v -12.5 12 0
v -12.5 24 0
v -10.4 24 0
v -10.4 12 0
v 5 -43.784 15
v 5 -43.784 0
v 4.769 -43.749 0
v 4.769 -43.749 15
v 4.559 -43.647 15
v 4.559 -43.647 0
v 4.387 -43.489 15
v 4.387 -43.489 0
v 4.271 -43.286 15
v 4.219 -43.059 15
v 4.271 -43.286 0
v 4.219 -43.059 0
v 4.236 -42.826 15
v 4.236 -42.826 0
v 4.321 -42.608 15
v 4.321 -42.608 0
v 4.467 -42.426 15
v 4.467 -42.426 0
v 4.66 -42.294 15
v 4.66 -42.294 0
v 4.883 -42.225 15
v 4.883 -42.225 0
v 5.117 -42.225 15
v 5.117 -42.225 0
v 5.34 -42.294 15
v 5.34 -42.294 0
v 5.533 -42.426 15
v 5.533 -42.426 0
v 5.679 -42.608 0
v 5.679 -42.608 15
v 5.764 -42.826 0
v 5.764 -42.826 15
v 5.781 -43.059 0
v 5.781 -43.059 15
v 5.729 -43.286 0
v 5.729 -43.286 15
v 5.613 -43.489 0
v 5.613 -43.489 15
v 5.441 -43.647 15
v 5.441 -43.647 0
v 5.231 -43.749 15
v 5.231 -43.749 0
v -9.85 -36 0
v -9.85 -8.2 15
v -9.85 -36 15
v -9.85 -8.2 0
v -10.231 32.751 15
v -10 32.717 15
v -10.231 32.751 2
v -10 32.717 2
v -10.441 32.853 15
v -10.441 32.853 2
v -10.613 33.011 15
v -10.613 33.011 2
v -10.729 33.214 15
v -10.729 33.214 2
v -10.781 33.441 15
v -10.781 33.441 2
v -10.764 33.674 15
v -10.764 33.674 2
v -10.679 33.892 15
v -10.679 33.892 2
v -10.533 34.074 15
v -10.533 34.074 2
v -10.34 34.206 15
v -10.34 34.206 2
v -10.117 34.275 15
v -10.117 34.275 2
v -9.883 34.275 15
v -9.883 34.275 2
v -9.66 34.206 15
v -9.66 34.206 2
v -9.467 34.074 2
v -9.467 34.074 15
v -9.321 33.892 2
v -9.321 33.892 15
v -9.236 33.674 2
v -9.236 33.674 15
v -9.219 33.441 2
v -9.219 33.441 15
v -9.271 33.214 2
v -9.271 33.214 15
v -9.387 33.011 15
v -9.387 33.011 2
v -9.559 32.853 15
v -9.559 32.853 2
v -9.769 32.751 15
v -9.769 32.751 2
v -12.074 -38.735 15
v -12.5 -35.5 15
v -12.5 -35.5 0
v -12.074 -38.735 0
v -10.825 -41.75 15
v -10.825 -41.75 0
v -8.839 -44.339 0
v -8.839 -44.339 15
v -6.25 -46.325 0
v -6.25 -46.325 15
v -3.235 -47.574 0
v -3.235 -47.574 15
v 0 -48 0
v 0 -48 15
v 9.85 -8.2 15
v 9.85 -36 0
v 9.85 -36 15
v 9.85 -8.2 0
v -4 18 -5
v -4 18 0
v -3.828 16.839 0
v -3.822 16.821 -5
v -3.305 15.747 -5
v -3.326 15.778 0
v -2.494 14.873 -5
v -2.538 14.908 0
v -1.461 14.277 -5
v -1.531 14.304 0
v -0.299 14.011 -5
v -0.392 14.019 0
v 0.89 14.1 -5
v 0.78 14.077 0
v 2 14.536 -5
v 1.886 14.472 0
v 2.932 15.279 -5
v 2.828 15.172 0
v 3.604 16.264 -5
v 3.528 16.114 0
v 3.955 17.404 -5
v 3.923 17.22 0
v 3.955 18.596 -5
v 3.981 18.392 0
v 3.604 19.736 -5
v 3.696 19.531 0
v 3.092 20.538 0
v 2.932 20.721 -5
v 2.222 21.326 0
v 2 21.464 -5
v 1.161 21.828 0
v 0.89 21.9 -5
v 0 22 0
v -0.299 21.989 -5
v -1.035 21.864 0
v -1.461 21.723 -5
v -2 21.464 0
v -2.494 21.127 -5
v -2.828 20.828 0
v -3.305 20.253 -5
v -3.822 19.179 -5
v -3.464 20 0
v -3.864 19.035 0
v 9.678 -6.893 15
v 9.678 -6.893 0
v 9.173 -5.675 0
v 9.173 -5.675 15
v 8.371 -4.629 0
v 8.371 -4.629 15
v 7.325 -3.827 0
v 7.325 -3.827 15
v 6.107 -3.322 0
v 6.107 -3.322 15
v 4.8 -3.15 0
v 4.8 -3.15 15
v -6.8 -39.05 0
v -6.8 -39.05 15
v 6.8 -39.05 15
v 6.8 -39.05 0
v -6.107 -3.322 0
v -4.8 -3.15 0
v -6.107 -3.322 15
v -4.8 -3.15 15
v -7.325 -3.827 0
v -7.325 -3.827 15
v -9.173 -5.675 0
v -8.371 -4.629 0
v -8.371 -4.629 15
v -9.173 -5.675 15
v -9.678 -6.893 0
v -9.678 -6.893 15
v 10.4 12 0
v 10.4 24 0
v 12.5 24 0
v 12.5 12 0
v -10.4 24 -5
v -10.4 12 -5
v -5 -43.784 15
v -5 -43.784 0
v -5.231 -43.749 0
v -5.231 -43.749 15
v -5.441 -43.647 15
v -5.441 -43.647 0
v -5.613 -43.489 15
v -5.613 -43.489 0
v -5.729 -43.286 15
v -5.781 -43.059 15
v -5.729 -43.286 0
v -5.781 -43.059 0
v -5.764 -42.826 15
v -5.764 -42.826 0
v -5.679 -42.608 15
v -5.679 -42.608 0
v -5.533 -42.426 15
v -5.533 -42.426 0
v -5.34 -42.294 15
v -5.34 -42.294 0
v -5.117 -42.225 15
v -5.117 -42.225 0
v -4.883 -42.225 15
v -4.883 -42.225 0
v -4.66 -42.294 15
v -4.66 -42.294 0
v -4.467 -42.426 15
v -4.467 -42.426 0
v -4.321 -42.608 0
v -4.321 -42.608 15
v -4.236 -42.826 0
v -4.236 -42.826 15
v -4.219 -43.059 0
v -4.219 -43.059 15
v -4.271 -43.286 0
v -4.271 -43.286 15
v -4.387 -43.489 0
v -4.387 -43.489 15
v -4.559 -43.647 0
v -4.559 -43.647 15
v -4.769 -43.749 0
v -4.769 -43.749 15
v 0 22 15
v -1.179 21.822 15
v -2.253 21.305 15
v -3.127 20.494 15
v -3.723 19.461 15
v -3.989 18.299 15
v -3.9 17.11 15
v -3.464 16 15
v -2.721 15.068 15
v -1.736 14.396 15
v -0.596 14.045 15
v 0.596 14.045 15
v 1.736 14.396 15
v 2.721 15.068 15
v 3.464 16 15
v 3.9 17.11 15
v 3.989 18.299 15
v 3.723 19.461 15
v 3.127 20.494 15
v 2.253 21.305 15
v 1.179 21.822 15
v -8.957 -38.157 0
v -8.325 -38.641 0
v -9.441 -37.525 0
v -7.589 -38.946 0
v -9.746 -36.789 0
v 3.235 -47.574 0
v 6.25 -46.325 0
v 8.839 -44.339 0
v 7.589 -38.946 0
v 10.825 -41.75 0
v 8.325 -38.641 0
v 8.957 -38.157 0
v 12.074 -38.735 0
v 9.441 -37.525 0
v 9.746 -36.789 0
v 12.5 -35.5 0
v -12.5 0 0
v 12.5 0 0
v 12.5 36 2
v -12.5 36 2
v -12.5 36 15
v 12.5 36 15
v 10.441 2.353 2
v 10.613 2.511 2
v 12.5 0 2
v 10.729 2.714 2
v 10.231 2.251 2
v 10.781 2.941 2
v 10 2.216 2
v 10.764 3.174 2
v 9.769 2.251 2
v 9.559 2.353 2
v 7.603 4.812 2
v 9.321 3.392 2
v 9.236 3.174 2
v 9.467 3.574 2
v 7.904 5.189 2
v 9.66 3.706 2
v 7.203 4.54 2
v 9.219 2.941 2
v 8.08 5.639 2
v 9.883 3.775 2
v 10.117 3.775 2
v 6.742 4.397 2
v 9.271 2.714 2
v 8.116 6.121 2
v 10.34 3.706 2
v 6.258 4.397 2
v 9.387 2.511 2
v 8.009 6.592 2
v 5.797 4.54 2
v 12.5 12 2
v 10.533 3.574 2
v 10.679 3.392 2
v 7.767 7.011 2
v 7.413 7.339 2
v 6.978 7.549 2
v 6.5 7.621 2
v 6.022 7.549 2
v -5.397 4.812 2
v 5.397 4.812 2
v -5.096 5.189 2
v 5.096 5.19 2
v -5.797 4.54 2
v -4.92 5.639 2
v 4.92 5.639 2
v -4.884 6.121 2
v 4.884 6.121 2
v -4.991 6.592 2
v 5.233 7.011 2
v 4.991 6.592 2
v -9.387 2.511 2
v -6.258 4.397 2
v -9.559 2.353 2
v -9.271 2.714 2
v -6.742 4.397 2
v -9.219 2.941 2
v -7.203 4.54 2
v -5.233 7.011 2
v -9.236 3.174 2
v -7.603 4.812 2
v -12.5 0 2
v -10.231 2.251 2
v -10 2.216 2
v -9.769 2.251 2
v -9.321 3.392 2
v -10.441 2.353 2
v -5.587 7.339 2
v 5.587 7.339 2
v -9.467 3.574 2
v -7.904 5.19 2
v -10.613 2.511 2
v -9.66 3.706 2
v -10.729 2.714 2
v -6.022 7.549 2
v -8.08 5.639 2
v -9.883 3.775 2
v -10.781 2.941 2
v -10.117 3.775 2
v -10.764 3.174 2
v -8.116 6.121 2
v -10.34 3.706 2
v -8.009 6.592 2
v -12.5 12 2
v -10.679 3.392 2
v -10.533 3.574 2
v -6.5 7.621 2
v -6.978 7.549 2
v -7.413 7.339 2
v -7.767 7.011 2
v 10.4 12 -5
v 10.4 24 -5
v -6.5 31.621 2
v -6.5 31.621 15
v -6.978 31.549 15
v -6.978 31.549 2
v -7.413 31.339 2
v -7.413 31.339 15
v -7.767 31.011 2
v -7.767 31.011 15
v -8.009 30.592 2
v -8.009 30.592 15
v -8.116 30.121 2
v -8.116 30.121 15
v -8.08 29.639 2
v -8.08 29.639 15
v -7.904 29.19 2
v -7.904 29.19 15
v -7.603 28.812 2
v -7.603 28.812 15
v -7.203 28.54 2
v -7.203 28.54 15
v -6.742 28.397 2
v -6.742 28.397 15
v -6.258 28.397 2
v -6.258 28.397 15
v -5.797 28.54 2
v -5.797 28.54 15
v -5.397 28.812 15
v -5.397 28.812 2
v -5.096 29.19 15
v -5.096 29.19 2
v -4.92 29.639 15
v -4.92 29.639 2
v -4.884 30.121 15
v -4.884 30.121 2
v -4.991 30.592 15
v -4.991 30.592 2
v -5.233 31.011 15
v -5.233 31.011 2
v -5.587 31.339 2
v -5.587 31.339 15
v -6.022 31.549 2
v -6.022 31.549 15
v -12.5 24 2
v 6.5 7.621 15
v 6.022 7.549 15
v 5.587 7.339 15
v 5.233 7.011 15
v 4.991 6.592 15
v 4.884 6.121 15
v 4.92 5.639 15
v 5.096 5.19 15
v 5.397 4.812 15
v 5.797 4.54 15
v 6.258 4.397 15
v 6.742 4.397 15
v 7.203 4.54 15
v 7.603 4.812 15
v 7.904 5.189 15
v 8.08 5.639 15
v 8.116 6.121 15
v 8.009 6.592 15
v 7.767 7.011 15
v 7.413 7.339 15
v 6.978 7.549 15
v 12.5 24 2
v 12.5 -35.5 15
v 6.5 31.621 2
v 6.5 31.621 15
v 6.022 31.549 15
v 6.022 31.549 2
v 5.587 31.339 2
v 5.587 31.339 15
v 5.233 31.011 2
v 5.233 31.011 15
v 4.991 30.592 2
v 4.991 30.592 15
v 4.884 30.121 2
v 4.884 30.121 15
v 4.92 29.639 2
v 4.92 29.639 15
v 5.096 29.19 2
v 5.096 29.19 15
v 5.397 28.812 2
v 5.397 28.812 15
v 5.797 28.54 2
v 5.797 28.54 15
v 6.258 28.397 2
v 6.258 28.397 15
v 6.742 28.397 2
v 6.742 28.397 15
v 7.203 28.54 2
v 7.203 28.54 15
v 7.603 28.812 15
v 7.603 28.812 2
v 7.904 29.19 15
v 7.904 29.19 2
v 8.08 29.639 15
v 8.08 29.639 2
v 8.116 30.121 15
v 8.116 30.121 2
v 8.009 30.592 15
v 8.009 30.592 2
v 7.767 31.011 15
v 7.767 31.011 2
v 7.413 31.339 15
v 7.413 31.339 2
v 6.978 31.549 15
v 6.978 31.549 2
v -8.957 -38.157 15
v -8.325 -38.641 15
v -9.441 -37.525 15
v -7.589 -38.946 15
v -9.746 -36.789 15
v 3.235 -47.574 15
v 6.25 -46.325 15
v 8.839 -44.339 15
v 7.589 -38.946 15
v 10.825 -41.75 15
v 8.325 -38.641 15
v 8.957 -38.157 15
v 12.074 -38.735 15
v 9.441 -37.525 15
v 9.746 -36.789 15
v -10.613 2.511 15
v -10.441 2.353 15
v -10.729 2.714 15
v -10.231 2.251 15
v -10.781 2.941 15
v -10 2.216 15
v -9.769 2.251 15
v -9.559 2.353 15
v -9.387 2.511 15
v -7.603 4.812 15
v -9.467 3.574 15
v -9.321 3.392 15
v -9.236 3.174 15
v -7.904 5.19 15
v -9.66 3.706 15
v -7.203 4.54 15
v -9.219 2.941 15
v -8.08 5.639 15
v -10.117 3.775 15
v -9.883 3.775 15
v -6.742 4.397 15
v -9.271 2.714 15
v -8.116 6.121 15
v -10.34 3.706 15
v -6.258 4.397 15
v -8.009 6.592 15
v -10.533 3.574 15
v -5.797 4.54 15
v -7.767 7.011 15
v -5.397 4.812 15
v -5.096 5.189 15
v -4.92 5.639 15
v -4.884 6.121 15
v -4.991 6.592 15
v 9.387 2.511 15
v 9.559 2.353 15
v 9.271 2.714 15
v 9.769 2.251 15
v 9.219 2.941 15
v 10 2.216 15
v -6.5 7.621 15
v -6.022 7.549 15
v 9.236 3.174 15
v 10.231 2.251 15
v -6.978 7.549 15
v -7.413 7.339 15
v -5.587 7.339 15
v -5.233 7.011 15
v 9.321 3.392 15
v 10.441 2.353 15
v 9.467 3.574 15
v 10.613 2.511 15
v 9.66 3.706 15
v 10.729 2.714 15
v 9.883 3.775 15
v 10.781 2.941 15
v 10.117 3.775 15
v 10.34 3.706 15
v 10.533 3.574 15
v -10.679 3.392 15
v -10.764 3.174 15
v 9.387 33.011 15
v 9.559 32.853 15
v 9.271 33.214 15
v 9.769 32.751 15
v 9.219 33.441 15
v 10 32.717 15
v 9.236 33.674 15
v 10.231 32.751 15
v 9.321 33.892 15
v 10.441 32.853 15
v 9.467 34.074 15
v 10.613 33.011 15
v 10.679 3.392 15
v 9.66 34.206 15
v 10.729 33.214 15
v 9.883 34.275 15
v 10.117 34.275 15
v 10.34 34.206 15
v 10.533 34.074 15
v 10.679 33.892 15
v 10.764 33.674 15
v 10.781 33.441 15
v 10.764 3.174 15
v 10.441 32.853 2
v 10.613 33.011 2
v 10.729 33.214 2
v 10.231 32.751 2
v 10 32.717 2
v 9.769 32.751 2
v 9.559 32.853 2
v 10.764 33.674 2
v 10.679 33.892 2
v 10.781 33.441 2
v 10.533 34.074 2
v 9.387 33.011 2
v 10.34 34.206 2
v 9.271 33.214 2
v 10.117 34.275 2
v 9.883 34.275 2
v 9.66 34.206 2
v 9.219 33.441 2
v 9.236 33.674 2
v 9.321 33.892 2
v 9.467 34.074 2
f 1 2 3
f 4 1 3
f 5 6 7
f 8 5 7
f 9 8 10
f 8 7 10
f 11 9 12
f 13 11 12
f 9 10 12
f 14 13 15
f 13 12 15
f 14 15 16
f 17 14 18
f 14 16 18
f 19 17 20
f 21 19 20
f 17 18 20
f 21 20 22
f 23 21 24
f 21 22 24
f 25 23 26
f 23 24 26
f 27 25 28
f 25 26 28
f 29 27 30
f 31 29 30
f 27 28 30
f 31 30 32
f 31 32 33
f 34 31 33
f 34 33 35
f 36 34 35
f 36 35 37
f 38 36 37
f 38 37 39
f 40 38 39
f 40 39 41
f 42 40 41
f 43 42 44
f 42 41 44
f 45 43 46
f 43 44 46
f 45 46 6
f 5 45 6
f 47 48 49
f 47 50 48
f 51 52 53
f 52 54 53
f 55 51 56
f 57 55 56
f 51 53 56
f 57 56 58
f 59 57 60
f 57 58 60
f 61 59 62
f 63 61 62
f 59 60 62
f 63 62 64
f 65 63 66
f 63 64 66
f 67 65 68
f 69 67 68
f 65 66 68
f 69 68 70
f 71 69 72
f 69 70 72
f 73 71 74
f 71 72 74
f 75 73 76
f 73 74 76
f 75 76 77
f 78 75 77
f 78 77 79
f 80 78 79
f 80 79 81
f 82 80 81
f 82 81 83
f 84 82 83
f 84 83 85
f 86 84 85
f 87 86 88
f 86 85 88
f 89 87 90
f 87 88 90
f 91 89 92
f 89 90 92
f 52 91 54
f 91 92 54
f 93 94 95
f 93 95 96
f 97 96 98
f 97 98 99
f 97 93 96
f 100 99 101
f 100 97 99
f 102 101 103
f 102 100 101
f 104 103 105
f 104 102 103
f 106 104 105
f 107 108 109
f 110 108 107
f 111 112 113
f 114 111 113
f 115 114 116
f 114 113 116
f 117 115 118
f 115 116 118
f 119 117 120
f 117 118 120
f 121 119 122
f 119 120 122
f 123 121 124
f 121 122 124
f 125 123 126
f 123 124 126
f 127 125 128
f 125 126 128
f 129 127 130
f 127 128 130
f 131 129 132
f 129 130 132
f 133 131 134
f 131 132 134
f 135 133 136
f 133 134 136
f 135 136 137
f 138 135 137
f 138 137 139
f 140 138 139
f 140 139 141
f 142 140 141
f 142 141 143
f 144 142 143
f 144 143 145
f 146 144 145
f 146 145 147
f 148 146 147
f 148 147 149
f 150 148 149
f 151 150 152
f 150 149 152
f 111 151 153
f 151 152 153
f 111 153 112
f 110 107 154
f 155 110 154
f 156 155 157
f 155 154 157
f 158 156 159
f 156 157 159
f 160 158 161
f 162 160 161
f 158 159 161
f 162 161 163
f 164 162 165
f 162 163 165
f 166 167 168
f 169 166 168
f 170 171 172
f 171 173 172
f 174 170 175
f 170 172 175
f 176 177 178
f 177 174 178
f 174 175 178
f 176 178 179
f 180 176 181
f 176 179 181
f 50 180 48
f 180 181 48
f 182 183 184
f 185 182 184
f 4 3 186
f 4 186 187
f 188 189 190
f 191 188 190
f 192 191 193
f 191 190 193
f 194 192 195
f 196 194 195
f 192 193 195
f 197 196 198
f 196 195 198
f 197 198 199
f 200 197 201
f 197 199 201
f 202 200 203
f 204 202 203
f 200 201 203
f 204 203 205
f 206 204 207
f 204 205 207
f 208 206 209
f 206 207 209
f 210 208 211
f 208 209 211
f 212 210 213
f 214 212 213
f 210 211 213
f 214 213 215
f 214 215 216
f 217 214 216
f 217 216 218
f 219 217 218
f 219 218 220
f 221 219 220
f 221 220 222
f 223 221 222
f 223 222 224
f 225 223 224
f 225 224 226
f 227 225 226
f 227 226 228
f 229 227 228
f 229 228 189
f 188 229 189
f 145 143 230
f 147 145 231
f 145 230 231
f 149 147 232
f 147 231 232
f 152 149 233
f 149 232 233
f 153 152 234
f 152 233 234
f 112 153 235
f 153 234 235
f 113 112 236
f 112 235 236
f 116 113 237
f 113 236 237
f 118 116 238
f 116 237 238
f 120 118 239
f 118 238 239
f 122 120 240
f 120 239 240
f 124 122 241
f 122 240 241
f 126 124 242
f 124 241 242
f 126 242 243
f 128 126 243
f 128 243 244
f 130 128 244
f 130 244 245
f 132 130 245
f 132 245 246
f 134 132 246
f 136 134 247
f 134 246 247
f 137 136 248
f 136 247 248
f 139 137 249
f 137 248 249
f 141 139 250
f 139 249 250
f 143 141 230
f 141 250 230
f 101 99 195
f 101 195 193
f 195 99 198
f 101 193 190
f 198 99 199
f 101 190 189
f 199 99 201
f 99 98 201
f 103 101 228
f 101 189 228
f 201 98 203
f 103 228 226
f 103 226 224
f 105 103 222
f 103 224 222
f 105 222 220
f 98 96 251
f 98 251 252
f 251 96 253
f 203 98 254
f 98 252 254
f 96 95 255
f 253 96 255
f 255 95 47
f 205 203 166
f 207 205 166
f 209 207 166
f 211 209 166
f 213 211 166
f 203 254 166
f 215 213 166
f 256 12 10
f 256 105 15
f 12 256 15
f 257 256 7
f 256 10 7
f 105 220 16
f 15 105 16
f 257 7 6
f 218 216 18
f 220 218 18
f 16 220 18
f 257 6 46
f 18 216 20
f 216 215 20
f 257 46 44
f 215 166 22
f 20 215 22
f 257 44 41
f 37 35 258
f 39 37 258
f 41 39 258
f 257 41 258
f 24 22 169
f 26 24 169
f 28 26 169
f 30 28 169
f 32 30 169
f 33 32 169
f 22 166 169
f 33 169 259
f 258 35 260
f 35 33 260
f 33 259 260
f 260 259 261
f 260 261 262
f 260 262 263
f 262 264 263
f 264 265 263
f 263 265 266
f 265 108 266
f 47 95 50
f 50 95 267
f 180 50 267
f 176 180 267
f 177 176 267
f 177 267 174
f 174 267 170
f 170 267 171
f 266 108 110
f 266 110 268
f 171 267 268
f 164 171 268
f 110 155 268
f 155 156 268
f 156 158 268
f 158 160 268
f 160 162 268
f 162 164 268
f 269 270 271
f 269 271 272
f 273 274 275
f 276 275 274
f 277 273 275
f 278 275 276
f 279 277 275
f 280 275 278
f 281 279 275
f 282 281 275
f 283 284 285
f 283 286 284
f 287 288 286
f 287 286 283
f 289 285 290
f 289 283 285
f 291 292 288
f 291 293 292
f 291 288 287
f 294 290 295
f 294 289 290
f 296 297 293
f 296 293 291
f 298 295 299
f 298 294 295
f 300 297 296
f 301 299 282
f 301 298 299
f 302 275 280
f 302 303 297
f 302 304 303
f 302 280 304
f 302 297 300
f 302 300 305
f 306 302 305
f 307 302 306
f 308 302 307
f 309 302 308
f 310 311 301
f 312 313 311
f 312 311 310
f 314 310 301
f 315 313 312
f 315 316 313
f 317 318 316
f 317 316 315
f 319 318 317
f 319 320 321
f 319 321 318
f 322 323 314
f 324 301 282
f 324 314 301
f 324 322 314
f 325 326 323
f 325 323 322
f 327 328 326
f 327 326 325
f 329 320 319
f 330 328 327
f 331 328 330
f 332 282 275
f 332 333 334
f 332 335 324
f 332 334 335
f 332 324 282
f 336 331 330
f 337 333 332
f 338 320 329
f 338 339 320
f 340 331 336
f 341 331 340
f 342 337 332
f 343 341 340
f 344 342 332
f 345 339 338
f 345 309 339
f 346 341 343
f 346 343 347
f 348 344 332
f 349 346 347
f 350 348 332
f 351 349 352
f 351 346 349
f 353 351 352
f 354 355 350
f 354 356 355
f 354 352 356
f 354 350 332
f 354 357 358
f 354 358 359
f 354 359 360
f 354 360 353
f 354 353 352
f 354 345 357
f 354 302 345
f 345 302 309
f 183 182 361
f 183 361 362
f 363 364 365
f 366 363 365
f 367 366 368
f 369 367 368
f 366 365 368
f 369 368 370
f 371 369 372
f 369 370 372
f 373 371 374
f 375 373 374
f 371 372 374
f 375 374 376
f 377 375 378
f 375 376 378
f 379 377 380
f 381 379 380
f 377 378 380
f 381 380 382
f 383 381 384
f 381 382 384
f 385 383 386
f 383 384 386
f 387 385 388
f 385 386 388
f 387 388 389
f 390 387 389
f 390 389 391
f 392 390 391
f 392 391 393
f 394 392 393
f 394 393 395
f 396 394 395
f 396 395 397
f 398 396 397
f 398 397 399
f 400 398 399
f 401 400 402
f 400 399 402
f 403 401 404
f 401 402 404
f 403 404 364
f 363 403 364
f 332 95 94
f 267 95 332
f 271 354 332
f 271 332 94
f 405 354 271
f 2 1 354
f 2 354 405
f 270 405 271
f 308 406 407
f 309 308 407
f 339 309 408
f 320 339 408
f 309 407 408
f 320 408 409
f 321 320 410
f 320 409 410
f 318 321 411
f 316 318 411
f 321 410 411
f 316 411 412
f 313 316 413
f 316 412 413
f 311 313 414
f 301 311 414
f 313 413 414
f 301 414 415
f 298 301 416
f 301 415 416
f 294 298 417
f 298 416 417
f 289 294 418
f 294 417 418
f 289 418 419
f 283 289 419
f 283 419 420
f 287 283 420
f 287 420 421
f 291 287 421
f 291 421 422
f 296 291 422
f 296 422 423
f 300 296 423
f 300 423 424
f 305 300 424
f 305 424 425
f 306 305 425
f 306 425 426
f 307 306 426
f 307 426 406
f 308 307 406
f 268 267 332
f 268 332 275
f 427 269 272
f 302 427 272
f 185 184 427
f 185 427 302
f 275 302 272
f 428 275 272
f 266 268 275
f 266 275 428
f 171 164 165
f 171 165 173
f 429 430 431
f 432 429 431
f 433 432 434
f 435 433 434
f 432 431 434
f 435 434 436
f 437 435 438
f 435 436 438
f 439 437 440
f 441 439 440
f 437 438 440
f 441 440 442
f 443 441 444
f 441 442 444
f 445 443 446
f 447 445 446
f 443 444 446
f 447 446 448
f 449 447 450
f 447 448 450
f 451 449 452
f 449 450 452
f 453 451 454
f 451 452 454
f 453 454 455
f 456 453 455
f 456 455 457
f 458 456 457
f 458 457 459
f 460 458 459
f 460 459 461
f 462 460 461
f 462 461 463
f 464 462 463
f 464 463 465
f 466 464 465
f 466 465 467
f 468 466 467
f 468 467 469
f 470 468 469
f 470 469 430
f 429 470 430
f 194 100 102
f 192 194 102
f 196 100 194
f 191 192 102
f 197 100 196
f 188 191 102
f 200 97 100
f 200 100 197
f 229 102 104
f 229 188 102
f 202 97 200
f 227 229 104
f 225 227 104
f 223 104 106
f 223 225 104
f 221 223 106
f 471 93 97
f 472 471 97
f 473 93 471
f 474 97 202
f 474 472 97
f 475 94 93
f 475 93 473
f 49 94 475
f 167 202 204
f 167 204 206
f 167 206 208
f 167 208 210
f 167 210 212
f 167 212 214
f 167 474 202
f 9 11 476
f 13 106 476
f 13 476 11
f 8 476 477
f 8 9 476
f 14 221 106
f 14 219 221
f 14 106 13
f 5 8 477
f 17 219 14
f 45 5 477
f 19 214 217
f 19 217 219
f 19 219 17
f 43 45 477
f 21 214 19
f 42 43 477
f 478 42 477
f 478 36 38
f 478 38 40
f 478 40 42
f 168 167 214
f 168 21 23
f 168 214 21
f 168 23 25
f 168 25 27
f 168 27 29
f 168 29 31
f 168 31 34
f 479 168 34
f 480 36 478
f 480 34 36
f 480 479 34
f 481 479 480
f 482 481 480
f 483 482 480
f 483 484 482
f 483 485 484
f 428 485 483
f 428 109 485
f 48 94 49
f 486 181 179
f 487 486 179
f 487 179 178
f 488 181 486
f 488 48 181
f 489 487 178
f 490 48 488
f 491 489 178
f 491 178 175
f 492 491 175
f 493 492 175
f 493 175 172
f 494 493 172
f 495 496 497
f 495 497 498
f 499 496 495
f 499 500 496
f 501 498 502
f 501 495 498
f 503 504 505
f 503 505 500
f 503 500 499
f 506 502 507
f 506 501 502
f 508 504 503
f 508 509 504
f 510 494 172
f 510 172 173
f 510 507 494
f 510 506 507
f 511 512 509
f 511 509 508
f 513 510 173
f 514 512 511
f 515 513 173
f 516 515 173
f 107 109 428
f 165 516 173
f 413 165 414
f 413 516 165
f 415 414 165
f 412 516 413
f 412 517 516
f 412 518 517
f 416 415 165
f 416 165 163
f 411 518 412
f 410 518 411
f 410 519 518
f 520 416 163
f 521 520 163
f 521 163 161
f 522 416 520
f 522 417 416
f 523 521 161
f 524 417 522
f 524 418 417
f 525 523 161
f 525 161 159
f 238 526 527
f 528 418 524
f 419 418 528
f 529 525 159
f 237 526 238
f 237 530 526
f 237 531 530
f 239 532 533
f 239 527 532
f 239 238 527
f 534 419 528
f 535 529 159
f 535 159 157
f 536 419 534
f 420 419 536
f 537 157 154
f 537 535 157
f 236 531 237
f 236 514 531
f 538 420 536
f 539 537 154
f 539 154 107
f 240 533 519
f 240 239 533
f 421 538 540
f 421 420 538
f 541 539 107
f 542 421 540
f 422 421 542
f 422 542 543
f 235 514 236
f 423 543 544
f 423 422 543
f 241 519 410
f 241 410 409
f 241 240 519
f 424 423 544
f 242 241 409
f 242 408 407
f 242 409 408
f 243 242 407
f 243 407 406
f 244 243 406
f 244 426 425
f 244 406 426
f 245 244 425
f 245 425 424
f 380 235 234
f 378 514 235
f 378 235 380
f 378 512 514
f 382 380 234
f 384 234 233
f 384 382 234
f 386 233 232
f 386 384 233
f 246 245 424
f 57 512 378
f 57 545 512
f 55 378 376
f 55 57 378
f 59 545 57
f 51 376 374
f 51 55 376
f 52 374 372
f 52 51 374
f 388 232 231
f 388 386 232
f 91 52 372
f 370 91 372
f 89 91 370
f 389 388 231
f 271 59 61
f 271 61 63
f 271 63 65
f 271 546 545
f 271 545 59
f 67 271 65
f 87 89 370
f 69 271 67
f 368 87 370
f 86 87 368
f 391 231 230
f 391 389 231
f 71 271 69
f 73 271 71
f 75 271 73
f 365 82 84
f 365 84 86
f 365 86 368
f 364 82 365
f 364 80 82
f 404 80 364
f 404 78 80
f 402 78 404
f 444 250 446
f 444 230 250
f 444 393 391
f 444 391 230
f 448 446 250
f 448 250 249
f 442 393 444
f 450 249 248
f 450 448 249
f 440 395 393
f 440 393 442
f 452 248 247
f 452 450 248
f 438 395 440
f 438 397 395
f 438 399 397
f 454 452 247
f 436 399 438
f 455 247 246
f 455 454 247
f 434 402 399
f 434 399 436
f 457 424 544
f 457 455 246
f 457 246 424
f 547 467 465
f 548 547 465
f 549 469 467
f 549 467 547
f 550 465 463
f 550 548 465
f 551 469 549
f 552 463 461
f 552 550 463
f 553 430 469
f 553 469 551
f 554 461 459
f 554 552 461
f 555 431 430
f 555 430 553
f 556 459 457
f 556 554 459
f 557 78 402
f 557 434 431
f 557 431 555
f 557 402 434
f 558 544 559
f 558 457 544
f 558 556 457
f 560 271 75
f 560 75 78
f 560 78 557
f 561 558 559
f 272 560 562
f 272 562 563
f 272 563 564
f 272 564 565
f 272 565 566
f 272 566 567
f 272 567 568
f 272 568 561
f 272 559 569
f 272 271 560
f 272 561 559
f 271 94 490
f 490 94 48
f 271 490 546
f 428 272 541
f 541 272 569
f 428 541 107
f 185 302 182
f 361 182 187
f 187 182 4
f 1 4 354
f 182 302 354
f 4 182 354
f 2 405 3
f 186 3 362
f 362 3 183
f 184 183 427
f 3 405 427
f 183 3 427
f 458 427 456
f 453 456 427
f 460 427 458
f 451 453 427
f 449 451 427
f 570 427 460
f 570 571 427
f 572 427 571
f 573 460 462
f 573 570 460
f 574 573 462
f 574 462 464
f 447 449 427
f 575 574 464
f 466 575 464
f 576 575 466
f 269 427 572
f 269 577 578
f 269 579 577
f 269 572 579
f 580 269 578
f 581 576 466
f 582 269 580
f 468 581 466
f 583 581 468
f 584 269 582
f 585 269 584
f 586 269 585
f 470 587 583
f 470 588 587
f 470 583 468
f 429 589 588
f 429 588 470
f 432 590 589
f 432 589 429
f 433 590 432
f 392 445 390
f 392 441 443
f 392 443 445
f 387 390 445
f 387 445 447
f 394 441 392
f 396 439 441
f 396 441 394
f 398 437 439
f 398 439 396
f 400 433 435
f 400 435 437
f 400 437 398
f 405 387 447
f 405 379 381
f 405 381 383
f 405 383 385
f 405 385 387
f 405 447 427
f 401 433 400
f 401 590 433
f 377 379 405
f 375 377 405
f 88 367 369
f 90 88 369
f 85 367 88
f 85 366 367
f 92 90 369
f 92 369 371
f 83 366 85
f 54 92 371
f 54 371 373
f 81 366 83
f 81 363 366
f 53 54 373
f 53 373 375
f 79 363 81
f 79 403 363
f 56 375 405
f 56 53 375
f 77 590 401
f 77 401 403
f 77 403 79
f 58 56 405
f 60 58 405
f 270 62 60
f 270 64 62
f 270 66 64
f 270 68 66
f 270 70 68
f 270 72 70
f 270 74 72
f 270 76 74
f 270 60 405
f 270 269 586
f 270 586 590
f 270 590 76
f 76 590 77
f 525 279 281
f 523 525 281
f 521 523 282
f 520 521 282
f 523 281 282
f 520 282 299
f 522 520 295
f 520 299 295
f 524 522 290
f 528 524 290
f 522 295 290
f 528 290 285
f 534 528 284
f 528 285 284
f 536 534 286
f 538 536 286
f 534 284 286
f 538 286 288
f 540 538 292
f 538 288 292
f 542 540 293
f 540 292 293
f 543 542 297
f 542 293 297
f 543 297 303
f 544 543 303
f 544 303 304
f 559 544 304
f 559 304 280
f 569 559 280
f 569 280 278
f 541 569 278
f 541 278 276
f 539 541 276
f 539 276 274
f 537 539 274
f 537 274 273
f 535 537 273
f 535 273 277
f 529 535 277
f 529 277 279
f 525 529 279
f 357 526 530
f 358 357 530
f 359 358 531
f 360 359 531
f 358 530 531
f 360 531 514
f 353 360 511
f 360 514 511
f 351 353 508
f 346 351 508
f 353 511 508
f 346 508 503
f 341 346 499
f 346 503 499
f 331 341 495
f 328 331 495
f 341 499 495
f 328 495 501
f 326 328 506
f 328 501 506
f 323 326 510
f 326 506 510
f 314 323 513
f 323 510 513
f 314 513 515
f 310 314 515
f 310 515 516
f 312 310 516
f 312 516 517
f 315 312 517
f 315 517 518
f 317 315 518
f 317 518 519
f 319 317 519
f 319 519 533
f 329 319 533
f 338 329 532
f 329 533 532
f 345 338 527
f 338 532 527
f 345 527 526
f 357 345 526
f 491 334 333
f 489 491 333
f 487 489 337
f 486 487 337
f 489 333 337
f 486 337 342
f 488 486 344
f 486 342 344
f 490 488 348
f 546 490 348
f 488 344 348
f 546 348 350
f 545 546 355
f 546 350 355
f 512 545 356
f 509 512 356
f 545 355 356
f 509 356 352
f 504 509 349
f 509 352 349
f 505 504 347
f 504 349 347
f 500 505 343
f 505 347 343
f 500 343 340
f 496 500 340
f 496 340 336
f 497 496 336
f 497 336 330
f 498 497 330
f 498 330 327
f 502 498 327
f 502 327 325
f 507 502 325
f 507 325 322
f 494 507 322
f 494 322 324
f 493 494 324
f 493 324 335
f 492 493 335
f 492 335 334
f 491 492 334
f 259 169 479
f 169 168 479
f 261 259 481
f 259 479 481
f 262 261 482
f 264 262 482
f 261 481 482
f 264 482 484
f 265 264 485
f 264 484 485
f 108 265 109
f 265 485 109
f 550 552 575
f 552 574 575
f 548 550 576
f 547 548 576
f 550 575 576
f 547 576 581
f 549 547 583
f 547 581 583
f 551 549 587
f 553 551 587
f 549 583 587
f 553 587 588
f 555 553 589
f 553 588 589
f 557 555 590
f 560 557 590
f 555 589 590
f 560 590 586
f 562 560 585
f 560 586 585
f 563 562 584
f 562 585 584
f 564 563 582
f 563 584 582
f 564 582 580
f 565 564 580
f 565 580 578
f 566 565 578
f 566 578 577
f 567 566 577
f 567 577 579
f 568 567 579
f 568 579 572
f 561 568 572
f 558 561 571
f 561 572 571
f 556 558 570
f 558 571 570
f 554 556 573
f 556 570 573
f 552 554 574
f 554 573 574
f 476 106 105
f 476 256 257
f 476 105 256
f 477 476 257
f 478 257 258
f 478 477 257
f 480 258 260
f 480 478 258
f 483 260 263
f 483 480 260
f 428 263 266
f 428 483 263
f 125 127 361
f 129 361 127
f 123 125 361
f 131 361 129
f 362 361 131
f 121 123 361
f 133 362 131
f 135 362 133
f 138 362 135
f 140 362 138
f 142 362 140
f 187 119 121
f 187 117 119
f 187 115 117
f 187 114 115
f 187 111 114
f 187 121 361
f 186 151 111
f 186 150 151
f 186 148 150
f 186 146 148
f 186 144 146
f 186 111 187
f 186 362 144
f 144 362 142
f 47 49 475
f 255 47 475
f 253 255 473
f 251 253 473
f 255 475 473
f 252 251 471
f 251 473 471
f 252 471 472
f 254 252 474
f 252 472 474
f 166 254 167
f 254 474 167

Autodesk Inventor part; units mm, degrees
ref_plane "YZ Plane" through (0, 0, 0) normal (1, 0, 0) x (0, 1, 0)
ref_plane "XZ Plane" through (0, 0, 0) normal (0, 1, 0) x (-1, 0, 0)
ref_plane "XY Plane" through (0, 0, 0) normal (0, 0, 1) x (1, 0, 0)
sketch "スケッチ1" plane through (0, 0, 0) normal (0, 0, 1) x (1, 0, 0)
  line L0 (-12.5, 36) -> (12.5, 36)
  line L1 (12.5, 36) -> (12.5, -48)
  line L2 (12.5, -48) -> (-12.5, -48)
  line L3 (-12.5, -48) -> (-12.5, 36)
  point P0 (0, 0)
  dimension "d0" = 36
  dimension "d1" = 25
  dimension "d2" = 12.5
  dimension "d3" = 48
extrude "押し出し1" add sketch "スケッチ1" along normal blind 15
sketch "スケッチ2" plane through (0, 0, 0) normal (0, 0, -1) x (-1, 0, 0)
  line L0 (-12.5, 36) -> (-12.5, -48) projected
  line L1 (12.5, -48) -> (12.5, 36) projected
  line L2 (-12.5, 36) -> (12.5, 36)
  line L3 (12.5, 36) -> (12.5, 24)
  line L4 (12.5, 24) -> (-12.5, 24)
  line L5 (-12.5, 24) -> (-12.5, 36)
  line L6 (12.5, 0) -> (-12.5, 0)
  line L7 (-12.5, 0) -> (-12.5, 12)
  line L8 (-12.5, 12) -> (12.5, 12)
  line L9 (12.5, 12) -> (12.5, 0)
  point P0 (0, 0)
  dimension "d6" = 12
  dimension "d42" = 12
  dimension "d66" = 12
extrude "押し出し2" cut sketch "スケッチ2" against normal blind 2 contours L2 L1 L4 L0 | L8 L1 L6 L0
sketch "スケッチ3" plane through (0, 0, 2) normal (0, 0, -1) x (-1, 0, 0)
  line L0 (12.5, 36) -> (12.5, 24) projected
  line L1 (-12.5, 36) -> (12.5, 36) projected
  line L2 (-12.5, 24) -> (-12.5, 36) projected
  point P0 (0, 0)
  point P1 (-6.5, 30)
  point P2 (6.5, 30)
  point P3 (12.5, 0)
  point P4 (-12.5, 0)
  dimension "d10" = 6
  dimension "d11" = 6
  dimension "d12" = 6
  dimension "d13" = 6
hole "Hole1" at (6.5, 30, 2) at (-6.5, 30, 2) direction (0, 0, 1) diameter 3.242 end through all thread size "M4x0.7" class "6H" standard "ISO Metric profile"
sketch "スケッチ6" plane through (0, 0, 2) normal (0, 0, -1) x (-1, 0, 0)
  line L0 (-12.5, 0) -> (12.5, 0) projected
  line L1 (12.5, 12) -> (12.5, 0) projected
  line L2 (-12.5, 0) -> (-12.5, 12) projected
  point P0 (0, 0)
  point P1 (-6.5, 6)
  point P2 (6.5, 6)
  dimension "d43" = 6
  dimension "d44" = 6
  dimension "d45" = 6
  dimension "d46" = 6
hole "Hole4" at (6.5, 6, 2) at (-6.5, 6, 2) direction (0, 0, 1) diameter 3.242 end through all thread size "M4x0.7" class "6H" standard "ANSI Metric M Profile"
sketch "スケッチ7" plane through (0, 0, 0) normal (0, 0, -1) x (-1, 0, 0)
  line L0 (12.5, 24) -> (-12.5, 24) projected
  line L1 (12.5, 12) -> (12.5, 24) projected
  point P0 (0, 0)
  point P1 (0, 18)
  dimension "d54" = 6
  dimension "d55" = 12.5
hole "Hole5" at (0, 18, 0) direction (0, 0, 1) diameter 8 end through all
sketch "スケッチ8" plane through (0, 0, 0) normal (0, 0, -1) x (-1, 0, 0)
  line L0 (12.5, 0) -> (-12.5, 0) projected
  line L1 (-12.5, 0) -> (-12.5, -48) projected
  line L2 (-12.5, -48) -> (12.5, -48) projected
  line L3 (12.5, -48) -> (12.5, 0) projected
  line L4 (0, 0) -> (0, -48)
  line L5 (12.5, -24) -> (-12.5, -24)
  line L6 (-9.85, -3.15) -> (9.85, -3.15)
  line L7 (9.85, -3.15) -> (9.85, -39.05)
  line L8 (9.85, -39.05) -> (-9.85, -39.05)
  line L9 (-9.85, -39.05) -> (-9.85, -3.15)
  dimension "d63" = 19.7
  dimension "d64" = 19.7
  dimension "d65" = 35.9
  dimension "d68" = 3.15
extrude "押し出し3" cut sketch "スケッチ8" against normal through all contours L6 L7 L5 L4 | L4 L5 L9 L6 | L7 L8 L4 L5 | L4 L8 L9 L5
fillet "フィレット2" radius 5.05 2 edges at (9.85, -3.15, 7.5) (-9.85, -3.15, 7.5)
fillet "フィレット3" radius 3.05 2 edges at (9.85, -39.05, 7.5) (-9.85, -39.05, 7.5)
fillet "フィレット4" radius 12.5 2 edges at (12.5, -48, 7.5) (-12.5, -48, 7.5)
sketch "スケッチ13" plane through (0, 0, 15) normal (0, 0, 1) x (1, 0, 0)
  arc A0 (-12.5, -35.5) -> (12.5, -35.5) centre (0, -35.5) ccw projected
  line L0 (12.5, 36) -> (12.5, -35.5) projected
  line L1 (-12.5, 36) -> (12.5, 36) projected
  line L2 (-12.5, -35.5) -> (-12.5, 36) projected
  circle A1 centre (-6.5, 6) radius 1.621 projected
  circle A2 centre (6.5, 6) radius 1.621 projected
  point P0 (0, 0)
  point P1 (-10, 33.5)
  point P2 (10, 33.5)
  point P3 (-10, 3)
  point P4 (10, 3)
  point P5 (-5, -43)
  point P6 (5, -43)
  dimension "d106" = 2.5
  dimension "d107" = 2.5
  dimension "d108" = 2.5
  dimension "d109" = 2.5
  dimension "d110" = 2.5
  dimension "d111" = 2.5
  dimension "d112" = 3
  dimension "d113" = 3
  dimension "d114" = 5
  dimension "d115" = 5
  dimension "d125" = 79
  dimension "d126" = 79
hole "Hole8" at (-10, 33.5, 15) at (10, 33.5, 15) at (-10, 3, 15) at (10, 3, 15) at (-5, -43, 15) at (5, -43, 15) direction (0, 0, -1) diameter 1.567 end through all thread size "M2x0.4" class "6H" standard "ISO Metric profile"
sketch "スケッチ14" plane through (0, 0, 0) normal (0, 0, -1) x (-1, 0, 0)
  circle A0 centre (0, 18) radius 4 projected
  line L0 (12.5, 24) -> (-12.5, 24) projected
  line L1 (-12.5, 24) -> (-12.5, 12) projected
  line L2 (-12.5, 12) -> (12.5, 12) projected
  line L3 (12.5, 12) -> (12.5, 24) projected
  line L4 (-10.4, 24) -> (10.4, 24)
  line L5 (10.4, 24) -> (10.4, 12)
  line L6 (10.4, 12) -> (-10.4, 12)
  line L7 (-10.4, 12) -> (-10.4, 24)
  point P0 (0, 0)
  dimension "d127" = 2.1
  dimension "d128" = 2.1
extrude "押し出し4" add sketch "スケッチ14" along normal blind 5 contours L5 L2 L7 L0
equation "\"d2\" = 0.5 * d1"
equation "\"d42\" = d6"
equation "\"d66\" = d42"
equation "\"d10\" = d12"
equation "\"d11\" = d10"
equation "\"d13\" = d12"
equation "\"d44\" = d43"
equation "\"d45\" = d43"
equation "\"d46\" = d43"
equation "\"d64\" = d63"
equation "\"d107\" = d106"
equation "\"d108\" = d106"
equation "\"d109\" = d106"
equation "\"d110\" = d106"
equation "\"d111\" = d106"
equation "\"d115\" = d114"
equation "\"d126\" = d125"
equation "\"d128\" = d127"
properties part number "JointC3'_2nd" material "ポリプロピレン"
